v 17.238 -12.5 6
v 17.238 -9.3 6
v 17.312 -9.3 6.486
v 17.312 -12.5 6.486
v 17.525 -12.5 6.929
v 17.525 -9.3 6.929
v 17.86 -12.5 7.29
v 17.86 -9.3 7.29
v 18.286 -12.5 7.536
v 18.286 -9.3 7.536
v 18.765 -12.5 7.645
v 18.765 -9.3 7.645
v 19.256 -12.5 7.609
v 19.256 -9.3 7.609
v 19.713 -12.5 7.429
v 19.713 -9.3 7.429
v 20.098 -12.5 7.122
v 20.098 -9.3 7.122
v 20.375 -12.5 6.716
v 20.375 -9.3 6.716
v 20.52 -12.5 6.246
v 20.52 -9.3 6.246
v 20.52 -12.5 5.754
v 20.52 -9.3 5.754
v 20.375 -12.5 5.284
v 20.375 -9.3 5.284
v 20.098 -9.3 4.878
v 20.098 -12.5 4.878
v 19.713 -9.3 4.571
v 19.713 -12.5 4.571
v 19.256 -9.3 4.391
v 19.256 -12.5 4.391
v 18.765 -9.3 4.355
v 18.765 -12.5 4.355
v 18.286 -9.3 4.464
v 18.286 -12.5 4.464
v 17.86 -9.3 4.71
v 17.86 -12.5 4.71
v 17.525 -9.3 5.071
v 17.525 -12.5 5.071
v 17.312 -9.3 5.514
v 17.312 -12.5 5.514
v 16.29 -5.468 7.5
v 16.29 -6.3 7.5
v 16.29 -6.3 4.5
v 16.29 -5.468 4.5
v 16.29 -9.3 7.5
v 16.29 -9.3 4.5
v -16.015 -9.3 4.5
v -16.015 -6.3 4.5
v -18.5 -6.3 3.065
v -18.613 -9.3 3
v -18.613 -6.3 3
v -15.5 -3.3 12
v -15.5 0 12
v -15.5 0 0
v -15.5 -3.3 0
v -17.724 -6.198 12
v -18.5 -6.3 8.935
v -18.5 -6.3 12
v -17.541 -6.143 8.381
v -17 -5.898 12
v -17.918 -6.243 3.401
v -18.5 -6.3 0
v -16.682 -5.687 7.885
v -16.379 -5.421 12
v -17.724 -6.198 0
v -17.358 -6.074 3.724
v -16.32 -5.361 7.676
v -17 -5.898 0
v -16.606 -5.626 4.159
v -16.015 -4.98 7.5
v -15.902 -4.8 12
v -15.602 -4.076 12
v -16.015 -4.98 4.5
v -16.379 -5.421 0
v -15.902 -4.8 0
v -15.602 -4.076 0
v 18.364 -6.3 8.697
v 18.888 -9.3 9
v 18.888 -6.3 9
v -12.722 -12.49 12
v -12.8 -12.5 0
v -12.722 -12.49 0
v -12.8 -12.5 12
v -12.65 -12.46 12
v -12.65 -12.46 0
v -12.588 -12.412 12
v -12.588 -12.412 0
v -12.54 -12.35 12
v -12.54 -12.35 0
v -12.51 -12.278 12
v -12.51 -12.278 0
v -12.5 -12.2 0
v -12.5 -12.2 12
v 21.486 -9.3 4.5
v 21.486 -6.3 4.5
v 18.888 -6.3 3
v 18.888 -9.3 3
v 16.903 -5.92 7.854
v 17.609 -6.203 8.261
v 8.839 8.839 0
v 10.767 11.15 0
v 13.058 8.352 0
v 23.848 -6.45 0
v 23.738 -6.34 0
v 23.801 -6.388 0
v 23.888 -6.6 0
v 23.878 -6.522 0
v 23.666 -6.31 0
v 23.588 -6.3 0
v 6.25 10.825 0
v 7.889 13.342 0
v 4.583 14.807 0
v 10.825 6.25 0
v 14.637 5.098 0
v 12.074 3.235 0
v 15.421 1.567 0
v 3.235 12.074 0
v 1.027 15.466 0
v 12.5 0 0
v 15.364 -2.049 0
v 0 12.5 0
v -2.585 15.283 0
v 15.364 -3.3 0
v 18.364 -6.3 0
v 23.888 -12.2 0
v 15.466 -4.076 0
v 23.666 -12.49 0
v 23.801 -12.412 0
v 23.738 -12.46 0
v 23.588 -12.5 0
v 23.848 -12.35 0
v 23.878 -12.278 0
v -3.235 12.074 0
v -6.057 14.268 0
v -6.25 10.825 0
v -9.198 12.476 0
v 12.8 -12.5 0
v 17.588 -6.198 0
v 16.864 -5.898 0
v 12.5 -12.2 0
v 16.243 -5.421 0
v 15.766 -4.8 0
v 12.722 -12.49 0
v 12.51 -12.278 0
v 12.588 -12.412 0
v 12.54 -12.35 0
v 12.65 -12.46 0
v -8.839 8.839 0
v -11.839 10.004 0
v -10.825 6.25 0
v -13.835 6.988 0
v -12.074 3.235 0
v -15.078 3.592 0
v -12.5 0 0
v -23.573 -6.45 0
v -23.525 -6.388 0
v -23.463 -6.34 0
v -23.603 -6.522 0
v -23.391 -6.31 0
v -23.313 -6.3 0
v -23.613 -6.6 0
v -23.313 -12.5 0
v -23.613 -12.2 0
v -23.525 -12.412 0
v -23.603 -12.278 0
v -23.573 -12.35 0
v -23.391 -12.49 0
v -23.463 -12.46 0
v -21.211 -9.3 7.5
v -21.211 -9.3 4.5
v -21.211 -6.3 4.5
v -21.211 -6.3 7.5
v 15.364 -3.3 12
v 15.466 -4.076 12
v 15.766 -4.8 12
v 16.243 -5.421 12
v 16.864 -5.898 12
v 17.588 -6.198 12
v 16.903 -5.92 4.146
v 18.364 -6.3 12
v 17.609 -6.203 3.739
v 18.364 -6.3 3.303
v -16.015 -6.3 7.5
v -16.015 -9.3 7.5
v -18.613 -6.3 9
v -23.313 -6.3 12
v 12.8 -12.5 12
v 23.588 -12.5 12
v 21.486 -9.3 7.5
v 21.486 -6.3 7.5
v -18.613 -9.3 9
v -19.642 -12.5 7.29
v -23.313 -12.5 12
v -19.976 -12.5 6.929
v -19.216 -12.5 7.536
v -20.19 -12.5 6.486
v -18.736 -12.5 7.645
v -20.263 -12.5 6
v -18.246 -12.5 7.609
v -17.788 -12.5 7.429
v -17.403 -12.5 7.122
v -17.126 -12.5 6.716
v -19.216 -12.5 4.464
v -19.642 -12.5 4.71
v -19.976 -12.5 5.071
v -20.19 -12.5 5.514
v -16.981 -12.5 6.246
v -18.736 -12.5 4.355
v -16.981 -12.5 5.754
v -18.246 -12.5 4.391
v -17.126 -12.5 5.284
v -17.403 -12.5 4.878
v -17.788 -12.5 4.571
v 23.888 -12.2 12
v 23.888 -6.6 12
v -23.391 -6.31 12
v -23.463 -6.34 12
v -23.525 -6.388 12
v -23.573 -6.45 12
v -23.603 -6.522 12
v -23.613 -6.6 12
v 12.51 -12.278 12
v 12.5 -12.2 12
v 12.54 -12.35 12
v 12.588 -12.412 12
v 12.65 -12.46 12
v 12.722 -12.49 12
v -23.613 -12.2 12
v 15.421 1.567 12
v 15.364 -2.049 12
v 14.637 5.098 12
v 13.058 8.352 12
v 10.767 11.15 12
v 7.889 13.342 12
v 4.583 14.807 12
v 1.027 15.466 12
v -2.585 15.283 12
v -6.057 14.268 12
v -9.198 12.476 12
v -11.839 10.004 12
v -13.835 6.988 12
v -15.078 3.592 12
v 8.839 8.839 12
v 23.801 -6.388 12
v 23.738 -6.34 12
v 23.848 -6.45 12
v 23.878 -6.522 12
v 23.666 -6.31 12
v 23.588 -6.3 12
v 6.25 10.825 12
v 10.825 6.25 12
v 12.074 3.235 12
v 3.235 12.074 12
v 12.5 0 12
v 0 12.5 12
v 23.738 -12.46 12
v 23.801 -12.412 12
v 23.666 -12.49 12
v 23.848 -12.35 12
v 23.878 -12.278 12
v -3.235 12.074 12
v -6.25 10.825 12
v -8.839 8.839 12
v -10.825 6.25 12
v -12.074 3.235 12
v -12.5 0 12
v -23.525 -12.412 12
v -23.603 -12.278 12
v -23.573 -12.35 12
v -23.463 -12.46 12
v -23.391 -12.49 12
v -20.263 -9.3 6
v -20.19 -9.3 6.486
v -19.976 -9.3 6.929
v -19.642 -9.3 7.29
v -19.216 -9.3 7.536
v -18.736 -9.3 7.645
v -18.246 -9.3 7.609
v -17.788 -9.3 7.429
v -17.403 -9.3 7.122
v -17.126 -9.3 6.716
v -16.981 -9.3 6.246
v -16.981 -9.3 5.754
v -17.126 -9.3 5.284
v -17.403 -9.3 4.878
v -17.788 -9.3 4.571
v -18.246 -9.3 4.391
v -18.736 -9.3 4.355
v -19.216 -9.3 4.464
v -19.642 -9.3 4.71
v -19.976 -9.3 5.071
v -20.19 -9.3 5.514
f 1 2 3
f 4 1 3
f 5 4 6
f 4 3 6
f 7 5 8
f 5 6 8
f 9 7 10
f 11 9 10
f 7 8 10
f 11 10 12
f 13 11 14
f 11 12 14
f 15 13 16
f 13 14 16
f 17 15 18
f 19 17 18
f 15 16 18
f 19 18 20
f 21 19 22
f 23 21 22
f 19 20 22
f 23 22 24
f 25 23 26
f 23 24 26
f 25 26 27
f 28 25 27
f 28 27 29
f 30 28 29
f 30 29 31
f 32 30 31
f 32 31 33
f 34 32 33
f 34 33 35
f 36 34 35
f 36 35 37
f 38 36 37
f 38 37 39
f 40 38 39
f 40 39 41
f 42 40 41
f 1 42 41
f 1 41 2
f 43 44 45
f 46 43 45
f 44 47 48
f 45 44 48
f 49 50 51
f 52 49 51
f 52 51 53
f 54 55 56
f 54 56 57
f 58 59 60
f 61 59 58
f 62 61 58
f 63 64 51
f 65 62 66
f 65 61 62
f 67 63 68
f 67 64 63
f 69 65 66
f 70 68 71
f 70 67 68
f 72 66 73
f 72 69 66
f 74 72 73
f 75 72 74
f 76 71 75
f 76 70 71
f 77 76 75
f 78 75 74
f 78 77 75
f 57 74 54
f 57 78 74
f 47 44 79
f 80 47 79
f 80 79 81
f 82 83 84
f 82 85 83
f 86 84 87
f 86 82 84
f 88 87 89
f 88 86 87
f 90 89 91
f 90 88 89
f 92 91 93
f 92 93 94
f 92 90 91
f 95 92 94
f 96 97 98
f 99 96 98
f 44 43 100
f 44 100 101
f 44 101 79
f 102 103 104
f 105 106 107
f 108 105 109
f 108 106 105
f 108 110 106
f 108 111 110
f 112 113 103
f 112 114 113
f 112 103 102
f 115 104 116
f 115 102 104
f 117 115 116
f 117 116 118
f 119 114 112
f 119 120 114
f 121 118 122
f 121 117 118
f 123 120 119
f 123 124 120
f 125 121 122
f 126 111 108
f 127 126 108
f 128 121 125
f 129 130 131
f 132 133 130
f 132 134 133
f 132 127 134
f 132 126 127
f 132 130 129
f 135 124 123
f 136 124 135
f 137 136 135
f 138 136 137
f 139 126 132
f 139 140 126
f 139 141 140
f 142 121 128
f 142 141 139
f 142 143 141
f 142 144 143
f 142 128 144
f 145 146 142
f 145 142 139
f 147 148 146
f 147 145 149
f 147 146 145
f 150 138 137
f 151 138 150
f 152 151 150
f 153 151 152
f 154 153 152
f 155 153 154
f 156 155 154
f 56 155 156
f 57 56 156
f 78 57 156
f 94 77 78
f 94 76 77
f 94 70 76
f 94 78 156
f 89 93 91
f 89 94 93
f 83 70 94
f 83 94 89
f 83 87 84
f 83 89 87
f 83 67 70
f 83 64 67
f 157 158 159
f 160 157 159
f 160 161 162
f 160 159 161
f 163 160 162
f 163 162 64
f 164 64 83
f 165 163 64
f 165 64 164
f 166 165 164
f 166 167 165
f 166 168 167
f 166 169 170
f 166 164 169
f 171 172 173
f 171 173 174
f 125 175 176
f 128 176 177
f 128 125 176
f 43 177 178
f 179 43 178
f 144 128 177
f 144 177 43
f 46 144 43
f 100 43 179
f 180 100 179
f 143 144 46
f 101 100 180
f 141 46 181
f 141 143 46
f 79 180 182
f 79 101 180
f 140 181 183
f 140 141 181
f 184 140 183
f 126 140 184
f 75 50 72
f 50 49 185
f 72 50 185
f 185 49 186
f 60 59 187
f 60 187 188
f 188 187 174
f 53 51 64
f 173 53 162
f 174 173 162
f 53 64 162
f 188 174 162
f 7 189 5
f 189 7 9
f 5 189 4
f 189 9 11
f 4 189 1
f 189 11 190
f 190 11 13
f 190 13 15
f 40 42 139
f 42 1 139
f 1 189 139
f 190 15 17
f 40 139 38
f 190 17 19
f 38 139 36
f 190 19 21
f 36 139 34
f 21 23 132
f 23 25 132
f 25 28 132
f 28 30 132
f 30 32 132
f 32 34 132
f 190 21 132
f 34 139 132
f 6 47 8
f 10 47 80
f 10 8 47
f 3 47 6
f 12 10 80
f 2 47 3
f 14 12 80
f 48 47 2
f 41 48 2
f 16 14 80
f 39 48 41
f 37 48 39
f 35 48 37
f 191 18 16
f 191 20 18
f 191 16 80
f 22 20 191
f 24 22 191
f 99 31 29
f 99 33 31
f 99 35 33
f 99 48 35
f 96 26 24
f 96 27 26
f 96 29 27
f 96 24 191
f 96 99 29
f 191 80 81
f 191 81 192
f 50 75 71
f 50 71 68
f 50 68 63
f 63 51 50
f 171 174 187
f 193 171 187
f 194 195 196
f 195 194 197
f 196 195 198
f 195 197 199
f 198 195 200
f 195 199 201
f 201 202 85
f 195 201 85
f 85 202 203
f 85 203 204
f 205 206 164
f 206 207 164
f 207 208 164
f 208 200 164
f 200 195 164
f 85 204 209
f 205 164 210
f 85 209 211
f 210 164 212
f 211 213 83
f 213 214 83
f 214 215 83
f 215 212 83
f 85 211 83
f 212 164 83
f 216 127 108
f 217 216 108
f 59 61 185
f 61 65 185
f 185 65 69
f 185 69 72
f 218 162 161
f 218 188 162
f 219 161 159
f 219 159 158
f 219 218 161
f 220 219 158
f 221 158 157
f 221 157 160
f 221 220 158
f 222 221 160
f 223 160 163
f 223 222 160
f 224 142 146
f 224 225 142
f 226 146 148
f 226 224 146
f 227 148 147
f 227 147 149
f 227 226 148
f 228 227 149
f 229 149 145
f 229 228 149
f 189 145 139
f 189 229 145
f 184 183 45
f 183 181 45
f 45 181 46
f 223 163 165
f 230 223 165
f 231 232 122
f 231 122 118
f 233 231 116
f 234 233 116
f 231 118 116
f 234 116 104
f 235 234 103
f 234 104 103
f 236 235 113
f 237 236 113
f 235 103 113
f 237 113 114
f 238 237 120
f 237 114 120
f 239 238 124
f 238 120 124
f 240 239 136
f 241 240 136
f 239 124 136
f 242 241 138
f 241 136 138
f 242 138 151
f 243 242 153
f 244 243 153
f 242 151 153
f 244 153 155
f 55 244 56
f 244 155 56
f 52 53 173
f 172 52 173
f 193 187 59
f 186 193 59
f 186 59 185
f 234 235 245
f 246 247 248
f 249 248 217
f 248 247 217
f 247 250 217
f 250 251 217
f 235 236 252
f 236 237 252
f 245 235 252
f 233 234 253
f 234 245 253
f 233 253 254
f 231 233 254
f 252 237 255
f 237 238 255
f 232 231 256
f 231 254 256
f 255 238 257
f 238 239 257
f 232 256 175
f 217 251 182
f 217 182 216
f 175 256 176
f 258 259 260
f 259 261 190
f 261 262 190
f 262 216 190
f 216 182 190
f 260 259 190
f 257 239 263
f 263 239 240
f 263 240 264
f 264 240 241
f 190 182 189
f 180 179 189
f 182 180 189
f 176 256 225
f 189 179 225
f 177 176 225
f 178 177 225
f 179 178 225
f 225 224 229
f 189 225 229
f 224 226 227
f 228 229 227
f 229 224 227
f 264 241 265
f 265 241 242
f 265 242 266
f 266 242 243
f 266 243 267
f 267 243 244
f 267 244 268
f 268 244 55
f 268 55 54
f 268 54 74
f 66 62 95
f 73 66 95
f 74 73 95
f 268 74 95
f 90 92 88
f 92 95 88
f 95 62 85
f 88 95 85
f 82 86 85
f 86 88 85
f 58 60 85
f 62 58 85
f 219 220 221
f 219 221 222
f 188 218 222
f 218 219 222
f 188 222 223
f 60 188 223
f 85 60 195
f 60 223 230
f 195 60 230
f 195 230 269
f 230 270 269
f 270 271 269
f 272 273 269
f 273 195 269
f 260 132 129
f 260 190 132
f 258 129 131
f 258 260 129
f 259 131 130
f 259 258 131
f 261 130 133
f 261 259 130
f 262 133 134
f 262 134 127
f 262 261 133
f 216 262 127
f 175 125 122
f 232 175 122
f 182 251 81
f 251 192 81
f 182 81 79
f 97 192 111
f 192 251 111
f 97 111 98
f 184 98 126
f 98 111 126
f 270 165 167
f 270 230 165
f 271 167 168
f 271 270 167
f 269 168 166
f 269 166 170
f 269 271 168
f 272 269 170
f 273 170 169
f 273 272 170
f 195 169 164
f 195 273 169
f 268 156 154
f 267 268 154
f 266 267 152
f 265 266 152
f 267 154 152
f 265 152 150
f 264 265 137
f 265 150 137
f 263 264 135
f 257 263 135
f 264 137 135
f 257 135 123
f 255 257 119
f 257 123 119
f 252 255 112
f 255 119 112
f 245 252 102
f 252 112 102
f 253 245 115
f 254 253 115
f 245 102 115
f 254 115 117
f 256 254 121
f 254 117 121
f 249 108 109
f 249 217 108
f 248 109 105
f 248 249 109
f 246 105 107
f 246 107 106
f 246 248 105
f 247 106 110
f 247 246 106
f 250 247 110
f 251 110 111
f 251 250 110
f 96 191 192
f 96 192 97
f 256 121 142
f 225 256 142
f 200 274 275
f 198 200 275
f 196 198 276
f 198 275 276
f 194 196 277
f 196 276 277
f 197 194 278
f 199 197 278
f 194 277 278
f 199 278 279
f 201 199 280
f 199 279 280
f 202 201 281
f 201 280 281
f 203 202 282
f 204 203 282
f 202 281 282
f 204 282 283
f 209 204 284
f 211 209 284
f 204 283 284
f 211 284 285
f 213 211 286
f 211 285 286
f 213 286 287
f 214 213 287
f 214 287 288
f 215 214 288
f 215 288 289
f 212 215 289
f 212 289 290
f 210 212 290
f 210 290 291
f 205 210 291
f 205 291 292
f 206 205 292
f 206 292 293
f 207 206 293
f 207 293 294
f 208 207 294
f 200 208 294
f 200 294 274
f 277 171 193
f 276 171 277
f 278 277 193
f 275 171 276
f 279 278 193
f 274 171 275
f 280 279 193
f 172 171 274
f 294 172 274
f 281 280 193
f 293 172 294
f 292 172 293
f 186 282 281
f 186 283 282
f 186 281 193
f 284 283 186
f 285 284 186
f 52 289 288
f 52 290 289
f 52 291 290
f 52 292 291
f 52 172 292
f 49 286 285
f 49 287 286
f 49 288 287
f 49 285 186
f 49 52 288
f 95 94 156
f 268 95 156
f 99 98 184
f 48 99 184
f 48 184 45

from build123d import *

# Parameters (mm, degrees)
BOSS_EXTRUDE1_DEPTH = 12
SKETCH2_R           = 1.65
CUT_EXTRUDE1_DEPTH  = 35.49487292
CUT_EXTRUDE2_DEPTH  = 3
FILLET2_R           = 3
FILLET3_R           = 0.3


with BuildPart() as part:
    # Sketch1 → Boss-Extrude1 (new body)
    with BuildSketch(Plane.XY):
        with BuildLine():
            Line((-12.5, -12.5), (-12.5, 0))
            ThreePointArc((-12.5, 0), (0, 12.5), (12.5, 0))
            Line((12.5, 0), (12.5, -12.5))
            Line((12.5, -12.5), (23.888412626, -12.5))
            Line((23.888412626, -12.5), (23.888412626, -6.3))
            Line((23.888412626, -6.3), (15.363999686, -6.3))
            Line((15.363999686, -6.3), (15.363999686, -2.048783456))
            ThreePointArc((15.363999686, -2.048783456), (1.026646207, 15.465962549), (-15.5, 0))
            Line((-15.5, 0), (-15.5, -6.3))
            Line((-15.5, -6.3), (-23.612861565, -6.3))
            Line((-23.612861565, -6.3), (-23.612861565, -12.5))
            Line((-23.612861565, -12.5), (-12.5, -12.5))
        make_face()
    extrude(amount=BOSS_EXTRUDE1_DEPTH)

    # Sketch2 → Cut-Extrude1 (cut, through all)
    with BuildSketch(Plane(origin=(0, -6.3, 0), x_dir=(1, 0, 0), z_dir=(0, 1, 0))):
        with Locations(Location((-18.612861565, -6, 0), (0, 0, 180))):
            Circle(SKETCH2_R)
        with Locations(Location((18.888412626, -6, 0), (0, 0, 180))):
            Circle(SKETCH2_R)
    extrude(amount=-CUT_EXTRUDE1_DEPTH, mode=Mode.SUBTRACT)

    # Sketch3 → Cut-Extrude2 (cut)
    with BuildSketch(Plane(origin=(0, -6.3, 0), x_dir=(1, 0, 0), z_dir=(0, 1, 0))):
        Polygon((18.888412626, -3), (16.290336415, -4.5), (16.290336415, -7.5), (18.888412626, -9), (21.486488837, -7.5), (21.486488837, -4.5), align=None)
        Polygon((-18.612861565, -9), (-16.014785354, -7.5), (-16.014785354, -4.5), (-18.612861565, -3), (-21.210937777, -4.5), (-21.210937777, -7.5), align=None)
    extrude(amount=-CUT_EXTRUDE2_DEPTH, mode=Mode.SUBTRACT)

    # Fillet2
    # the kernel refuses this fillet: 3 mm, written as the material it adds along each edge
    with BuildSketch(Plane(origin=(-15.5, -6.3, 0), x_dir=(0, 1, 0), z_dir=(0, 0, 1))) as fillet2_piece_1_section:
        with BuildLine():
            CenterArc((FILLET2_R, FILLET2_R), FILLET2_R, 180, 90)
            Line((0, FILLET2_R), (0, 0))
            Line((0, 0), (FILLET2_R, 0))
        make_face()
    fillet2_piece_1 = extrude(amount=12, mode=Mode.PRIVATE)
    fillet2_piece_1 = split(fillet2_piece_1, bisect_by=Plane(origin=(-16.699597169, -5.271939642, 4.104623714), z_dir=(0.5000000000000008, 0, -0.8660254037844383)), keep=Keep.TOP, mode=Mode.PRIVATE)
    fillet2_piece_1 = split(fillet2_piece_1, bisect_by=Plane(origin=(-16.014785354, -5.271939642, 2.345499265), z_dir=(1, 0, 0)), keep=Keep.TOP, mode=Mode.PRIVATE)
    add(fillet2_piece_1)
    with BuildSketch(Plane(origin=(-15.5, -6.3, 0), x_dir=(0, 1, 0), z_dir=(0, 0, 1))) as fillet2_piece_2_section:
        with BuildLine():
            CenterArc((FILLET2_R, FILLET2_R), FILLET2_R, 180, 90)
            Line((0, FILLET2_R), (0, 0))
            Line((0, 0), (FILLET2_R, 0))
        make_face()
    fillet2_piece_2 = extrude(amount=12, mode=Mode.PRIVATE)
    fillet2_piece_2 = split(fillet2_piece_2, bisect_by=Plane(origin=(-17.543441621, -5.964994309, 3.617429893), z_dir=(0.5000000000000008, 0, -0.8660254037844383)), keep=Keep.TOP, mode=Mode.PRIVATE)
    fillet2_piece_2 = split(fillet2_piece_2, bisect_by=Plane(origin=(-16.014785354, -5.964994309, 2.067102796), z_dir=(-1, 0, 0)), keep=Keep.TOP, mode=Mode.PRIVATE)
    add(fillet2_piece_2)
    with BuildSketch(Plane(origin=(-15.5, -6.3, 0), x_dir=(0, 1, 0), z_dir=(0, 0, 1))) as fillet2_piece_3_section:
        with BuildLine():
            CenterArc((FILLET2_R, FILLET2_R), FILLET2_R, 180, 90)
            Line((0, FILLET2_R), (0, 0))
            Line((0, 0), (FILLET2_R, 0))
        make_face()
    fillet2_piece_3 = extrude(amount=12, mode=Mode.PRIVATE)
    fillet2_piece_3 = split(fillet2_piece_3, bisect_by=Plane(origin=(-15.128726527, -5.296162819, 5.011566302), z_dir=(-0.5000000000000008, 0, 0.8660254037844383)), keep=Keep.TOP, mode=Mode.PRIVATE)
    fillet2_piece_3 = split(fillet2_piece_3, bisect_by=Plane(origin=(-16.014785354, -5.296162819, 6), z_dir=(1, 0, 0)), keep=Keep.TOP, mode=Mode.PRIVATE)
    fillet2_piece_3 = split(fillet2_piece_3, bisect_by=Plane(origin=(-15.128726527, -5.296162819, 6.988433698), z_dir=(-0.49999999999999994, 0, -0.8660254037844389)), keep=Keep.TOP, mode=Mode.PRIVATE)
    add(fillet2_piece_3)
    with BuildSketch(Plane(origin=(-15.5, -6.3, 0), x_dir=(0, 1, 0), z_dir=(0, 0, 1))) as fillet2_piece_4_section:
        with BuildLine():
            CenterArc((FILLET2_R, FILLET2_R), FILLET2_R, 180, 90)
            Line((0, FILLET2_R), (0, 0))
            Line((0, 0), (FILLET2_R, 0))
        make_face()
    fillet2_piece_4 = extrude(amount=12, mode=Mode.PRIVATE)
    fillet2_piece_4 = split(fillet2_piece_4, bisect_by=Plane(origin=(-16.014785354, -5.271939642, 9.654500735), z_dir=(1, 0, 0)), keep=Keep.TOP, mode=Mode.PRIVATE)
    fillet2_piece_4 = split(fillet2_piece_4, bisect_by=Plane(origin=(-16.699597169, -5.271939642, 7.895376286), z_dir=(0.49999999999999994, 0, 0.8660254037844389)), keep=Keep.TOP, mode=Mode.PRIVATE)
    add(fillet2_piece_4)
    with BuildSketch(Plane(origin=(-15.5, -6.3, 0), x_dir=(0, 1, 0), z_dir=(0, 0, 1))) as fillet2_piece_5_section:
        with BuildLine():
            CenterArc((FILLET2_R, FILLET2_R), FILLET2_R, 180, 90)
            Line((0, FILLET2_R), (0, 0))
            Line((0, 0), (FILLET2_R, 0))
        make_face()
    fillet2_piece_5 = extrude(amount=12, mode=Mode.PRIVATE)
    fillet2_piece_5 = split(fillet2_piece_5, bisect_by=Plane(origin=(-16.014785354, -5.964994309, 9.932897204), z_dir=(-1, 0, 0)), keep=Keep.TOP, mode=Mode.PRIVATE)
    fillet2_piece_5 = split(fillet2_piece_5, bisect_by=Plane(origin=(-17.543441621, -5.964994309, 8.382570107), z_dir=(0.49999999999999994, 0, 0.8660254037844389)), keep=Keep.TOP, mode=Mode.PRIVATE)
    add(fillet2_piece_5)
    with BuildSketch(Plane(origin=(15.363999686, -6.3, 0), x_dir=(0, 1, 0), z_dir=(0, 0, 1))) as fillet2_piece_6_section:
        with BuildLine():
            CenterArc((FILLET2_R, -FILLET2_R), FILLET2_R, 90, 90)
            Line((0, -FILLET2_R), (0, 0))
            Line((0, 0), (FILLET2_R, 0))
        make_face()
    fillet2_piece_6 = extrude(amount=12, mode=Mode.PRIVATE)
    fillet2_piece_6 = split(fillet2_piece_6, bisect_by=Plane(origin=(16.290336415, -5.412045629, 2.423810939), z_dir=(-1, 0, 0)), keep=Keep.TOP, mode=Mode.PRIVATE)
    fillet2_piece_6 = split(fillet2_piece_6, bisect_by=Plane(origin=(16.737778584, -5.412045629, 4.241669143), z_dir=(-0.4999999999999997, 0, -0.866025403784439)), keep=Keep.TOP, mode=Mode.PRIVATE)
    add(fillet2_piece_6)
    with BuildSketch(Plane(origin=(15.363999686, -6.3, 0), x_dir=(0, 1, 0), z_dir=(0, 0, 1))) as fillet2_piece_7_section:
        with BuildLine():
            CenterArc((FILLET2_R, -FILLET2_R), FILLET2_R, 90, 90)
            Line((0, -FILLET2_R), (0, 0))
            Line((0, 0), (FILLET2_R, 0))
        make_face()
    fillet2_piece_7 = extrude(amount=12, mode=Mode.PRIVATE)
    fillet2_piece_7 = split(fillet2_piece_7, bisect_by=Plane(origin=(16.290336415, -6.100859955, 2.085482464), z_dir=(1, 0, 0)), keep=Keep.TOP, mode=Mode.PRIVATE)
    fillet2_piece_7 = split(fillet2_piece_7, bisect_by=Plane(origin=(17.763282274, -6.100859955, 3.649594312), z_dir=(-0.4999999999999997, 0, -0.866025403784439)), keep=Keep.TOP, mode=Mode.PRIVATE)
    add(fillet2_piece_7)
    with BuildSketch(Plane(origin=(15.363999686, -6.3, 0), x_dir=(0, 1, 0), z_dir=(0, 0, 1))) as fillet2_piece_8_section:
        with BuildLine():
            CenterArc((FILLET2_R, -FILLET2_R), FILLET2_R, 90, 90)
            Line((0, -FILLET2_R), (0, 0))
            Line((0, 0), (FILLET2_R, 0))
        make_face()
    fillet2_piece_8 = extrude(amount=12, mode=Mode.PRIVATE)
    fillet2_piece_8 = split(fillet2_piece_8, bisect_by=Plane(origin=(15.225397876, -5.465952717, 6.885157448), z_dir=(0.5000000000000012, 0, -0.866025403784438)), keep=Keep.TOP, mode=Mode.PRIVATE)
    fillet2_piece_8 = split(fillet2_piece_8, bisect_by=Plane(origin=(16.290336415, -5.465952717, 6), z_dir=(-1, 0, 0)), keep=Keep.TOP, mode=Mode.PRIVATE)
    fillet2_piece_8 = split(fillet2_piece_8, bisect_by=Plane(origin=(15.225397876, -5.465952717, 5.114842552), z_dir=(0.4999999999999997, 0, 0.866025403784439)), keep=Keep.TOP, mode=Mode.PRIVATE)
    add(fillet2_piece_8)
    with BuildSketch(Plane(origin=(15.363999686, -6.3, 0), x_dir=(0, 1, 0), z_dir=(0, 0, 1))) as fillet2_piece_9_section:
        with BuildLine():
            CenterArc((FILLET2_R, -FILLET2_R), FILLET2_R, 90, 90)
            Line((0, -FILLET2_R), (0, 0))
            Line((0, 0), (FILLET2_R, 0))
        make_face()
    fillet2_piece_9 = extrude(amount=12, mode=Mode.PRIVATE)
    fillet2_piece_9 = split(fillet2_piece_9, bisect_by=Plane(origin=(16.737778584, -5.412045629, 7.758330857), z_dir=(-0.5000000000000012, 0, 0.866025403784438)), keep=Keep.TOP, mode=Mode.PRIVATE)
    fillet2_piece_9 = split(fillet2_piece_9, bisect_by=Plane(origin=(16.290336415, -5.412045629, 9.576189061), z_dir=(-1, 0, 0)), keep=Keep.TOP, mode=Mode.PRIVATE)
    add(fillet2_piece_9)
    with BuildSketch(Plane(origin=(15.363999686, -6.3, 0), x_dir=(0, 1, 0), z_dir=(0, 0, 1))) as fillet2_piece_10_section:
        with BuildLine():
            CenterArc((FILLET2_R, -FILLET2_R), FILLET2_R, 90, 90)
            Line((0, -FILLET2_R), (0, 0))
            Line((0, 0), (FILLET2_R, 0))
        make_face()
    fillet2_piece_10 = extrude(amount=12, mode=Mode.PRIVATE)
    fillet2_piece_10 = split(fillet2_piece_10, bisect_by=Plane(origin=(17.763282274, -6.100859955, 8.350405688), z_dir=(-0.5000000000000012, 0, 0.866025403784438)), keep=Keep.TOP, mode=Mode.PRIVATE)
    fillet2_piece_10 = split(fillet2_piece_10, bisect_by=Plane(origin=(16.290336415, -6.100859955, 9.914517536), z_dir=(1, 0, 0)), keep=Keep.TOP, mode=Mode.PRIVATE)
    add(fillet2_piece_10)

    # Fillet3
    fillet3_edges = [part.edges().sort_by_distance(p)[0] for p in [
        (23.888412626, -6.3, 6),
        (23.888412626, -12.5, 6),
        (12.5, -12.5, 6),
        (-12.5, -12.5, 6),
        (-23.612861565, -12.5, 6),
        (-23.612861565, -6.3, 6),
    ]]
    fillet(fillet3_edges, radius=FILLET3_R)


solid = part.part
